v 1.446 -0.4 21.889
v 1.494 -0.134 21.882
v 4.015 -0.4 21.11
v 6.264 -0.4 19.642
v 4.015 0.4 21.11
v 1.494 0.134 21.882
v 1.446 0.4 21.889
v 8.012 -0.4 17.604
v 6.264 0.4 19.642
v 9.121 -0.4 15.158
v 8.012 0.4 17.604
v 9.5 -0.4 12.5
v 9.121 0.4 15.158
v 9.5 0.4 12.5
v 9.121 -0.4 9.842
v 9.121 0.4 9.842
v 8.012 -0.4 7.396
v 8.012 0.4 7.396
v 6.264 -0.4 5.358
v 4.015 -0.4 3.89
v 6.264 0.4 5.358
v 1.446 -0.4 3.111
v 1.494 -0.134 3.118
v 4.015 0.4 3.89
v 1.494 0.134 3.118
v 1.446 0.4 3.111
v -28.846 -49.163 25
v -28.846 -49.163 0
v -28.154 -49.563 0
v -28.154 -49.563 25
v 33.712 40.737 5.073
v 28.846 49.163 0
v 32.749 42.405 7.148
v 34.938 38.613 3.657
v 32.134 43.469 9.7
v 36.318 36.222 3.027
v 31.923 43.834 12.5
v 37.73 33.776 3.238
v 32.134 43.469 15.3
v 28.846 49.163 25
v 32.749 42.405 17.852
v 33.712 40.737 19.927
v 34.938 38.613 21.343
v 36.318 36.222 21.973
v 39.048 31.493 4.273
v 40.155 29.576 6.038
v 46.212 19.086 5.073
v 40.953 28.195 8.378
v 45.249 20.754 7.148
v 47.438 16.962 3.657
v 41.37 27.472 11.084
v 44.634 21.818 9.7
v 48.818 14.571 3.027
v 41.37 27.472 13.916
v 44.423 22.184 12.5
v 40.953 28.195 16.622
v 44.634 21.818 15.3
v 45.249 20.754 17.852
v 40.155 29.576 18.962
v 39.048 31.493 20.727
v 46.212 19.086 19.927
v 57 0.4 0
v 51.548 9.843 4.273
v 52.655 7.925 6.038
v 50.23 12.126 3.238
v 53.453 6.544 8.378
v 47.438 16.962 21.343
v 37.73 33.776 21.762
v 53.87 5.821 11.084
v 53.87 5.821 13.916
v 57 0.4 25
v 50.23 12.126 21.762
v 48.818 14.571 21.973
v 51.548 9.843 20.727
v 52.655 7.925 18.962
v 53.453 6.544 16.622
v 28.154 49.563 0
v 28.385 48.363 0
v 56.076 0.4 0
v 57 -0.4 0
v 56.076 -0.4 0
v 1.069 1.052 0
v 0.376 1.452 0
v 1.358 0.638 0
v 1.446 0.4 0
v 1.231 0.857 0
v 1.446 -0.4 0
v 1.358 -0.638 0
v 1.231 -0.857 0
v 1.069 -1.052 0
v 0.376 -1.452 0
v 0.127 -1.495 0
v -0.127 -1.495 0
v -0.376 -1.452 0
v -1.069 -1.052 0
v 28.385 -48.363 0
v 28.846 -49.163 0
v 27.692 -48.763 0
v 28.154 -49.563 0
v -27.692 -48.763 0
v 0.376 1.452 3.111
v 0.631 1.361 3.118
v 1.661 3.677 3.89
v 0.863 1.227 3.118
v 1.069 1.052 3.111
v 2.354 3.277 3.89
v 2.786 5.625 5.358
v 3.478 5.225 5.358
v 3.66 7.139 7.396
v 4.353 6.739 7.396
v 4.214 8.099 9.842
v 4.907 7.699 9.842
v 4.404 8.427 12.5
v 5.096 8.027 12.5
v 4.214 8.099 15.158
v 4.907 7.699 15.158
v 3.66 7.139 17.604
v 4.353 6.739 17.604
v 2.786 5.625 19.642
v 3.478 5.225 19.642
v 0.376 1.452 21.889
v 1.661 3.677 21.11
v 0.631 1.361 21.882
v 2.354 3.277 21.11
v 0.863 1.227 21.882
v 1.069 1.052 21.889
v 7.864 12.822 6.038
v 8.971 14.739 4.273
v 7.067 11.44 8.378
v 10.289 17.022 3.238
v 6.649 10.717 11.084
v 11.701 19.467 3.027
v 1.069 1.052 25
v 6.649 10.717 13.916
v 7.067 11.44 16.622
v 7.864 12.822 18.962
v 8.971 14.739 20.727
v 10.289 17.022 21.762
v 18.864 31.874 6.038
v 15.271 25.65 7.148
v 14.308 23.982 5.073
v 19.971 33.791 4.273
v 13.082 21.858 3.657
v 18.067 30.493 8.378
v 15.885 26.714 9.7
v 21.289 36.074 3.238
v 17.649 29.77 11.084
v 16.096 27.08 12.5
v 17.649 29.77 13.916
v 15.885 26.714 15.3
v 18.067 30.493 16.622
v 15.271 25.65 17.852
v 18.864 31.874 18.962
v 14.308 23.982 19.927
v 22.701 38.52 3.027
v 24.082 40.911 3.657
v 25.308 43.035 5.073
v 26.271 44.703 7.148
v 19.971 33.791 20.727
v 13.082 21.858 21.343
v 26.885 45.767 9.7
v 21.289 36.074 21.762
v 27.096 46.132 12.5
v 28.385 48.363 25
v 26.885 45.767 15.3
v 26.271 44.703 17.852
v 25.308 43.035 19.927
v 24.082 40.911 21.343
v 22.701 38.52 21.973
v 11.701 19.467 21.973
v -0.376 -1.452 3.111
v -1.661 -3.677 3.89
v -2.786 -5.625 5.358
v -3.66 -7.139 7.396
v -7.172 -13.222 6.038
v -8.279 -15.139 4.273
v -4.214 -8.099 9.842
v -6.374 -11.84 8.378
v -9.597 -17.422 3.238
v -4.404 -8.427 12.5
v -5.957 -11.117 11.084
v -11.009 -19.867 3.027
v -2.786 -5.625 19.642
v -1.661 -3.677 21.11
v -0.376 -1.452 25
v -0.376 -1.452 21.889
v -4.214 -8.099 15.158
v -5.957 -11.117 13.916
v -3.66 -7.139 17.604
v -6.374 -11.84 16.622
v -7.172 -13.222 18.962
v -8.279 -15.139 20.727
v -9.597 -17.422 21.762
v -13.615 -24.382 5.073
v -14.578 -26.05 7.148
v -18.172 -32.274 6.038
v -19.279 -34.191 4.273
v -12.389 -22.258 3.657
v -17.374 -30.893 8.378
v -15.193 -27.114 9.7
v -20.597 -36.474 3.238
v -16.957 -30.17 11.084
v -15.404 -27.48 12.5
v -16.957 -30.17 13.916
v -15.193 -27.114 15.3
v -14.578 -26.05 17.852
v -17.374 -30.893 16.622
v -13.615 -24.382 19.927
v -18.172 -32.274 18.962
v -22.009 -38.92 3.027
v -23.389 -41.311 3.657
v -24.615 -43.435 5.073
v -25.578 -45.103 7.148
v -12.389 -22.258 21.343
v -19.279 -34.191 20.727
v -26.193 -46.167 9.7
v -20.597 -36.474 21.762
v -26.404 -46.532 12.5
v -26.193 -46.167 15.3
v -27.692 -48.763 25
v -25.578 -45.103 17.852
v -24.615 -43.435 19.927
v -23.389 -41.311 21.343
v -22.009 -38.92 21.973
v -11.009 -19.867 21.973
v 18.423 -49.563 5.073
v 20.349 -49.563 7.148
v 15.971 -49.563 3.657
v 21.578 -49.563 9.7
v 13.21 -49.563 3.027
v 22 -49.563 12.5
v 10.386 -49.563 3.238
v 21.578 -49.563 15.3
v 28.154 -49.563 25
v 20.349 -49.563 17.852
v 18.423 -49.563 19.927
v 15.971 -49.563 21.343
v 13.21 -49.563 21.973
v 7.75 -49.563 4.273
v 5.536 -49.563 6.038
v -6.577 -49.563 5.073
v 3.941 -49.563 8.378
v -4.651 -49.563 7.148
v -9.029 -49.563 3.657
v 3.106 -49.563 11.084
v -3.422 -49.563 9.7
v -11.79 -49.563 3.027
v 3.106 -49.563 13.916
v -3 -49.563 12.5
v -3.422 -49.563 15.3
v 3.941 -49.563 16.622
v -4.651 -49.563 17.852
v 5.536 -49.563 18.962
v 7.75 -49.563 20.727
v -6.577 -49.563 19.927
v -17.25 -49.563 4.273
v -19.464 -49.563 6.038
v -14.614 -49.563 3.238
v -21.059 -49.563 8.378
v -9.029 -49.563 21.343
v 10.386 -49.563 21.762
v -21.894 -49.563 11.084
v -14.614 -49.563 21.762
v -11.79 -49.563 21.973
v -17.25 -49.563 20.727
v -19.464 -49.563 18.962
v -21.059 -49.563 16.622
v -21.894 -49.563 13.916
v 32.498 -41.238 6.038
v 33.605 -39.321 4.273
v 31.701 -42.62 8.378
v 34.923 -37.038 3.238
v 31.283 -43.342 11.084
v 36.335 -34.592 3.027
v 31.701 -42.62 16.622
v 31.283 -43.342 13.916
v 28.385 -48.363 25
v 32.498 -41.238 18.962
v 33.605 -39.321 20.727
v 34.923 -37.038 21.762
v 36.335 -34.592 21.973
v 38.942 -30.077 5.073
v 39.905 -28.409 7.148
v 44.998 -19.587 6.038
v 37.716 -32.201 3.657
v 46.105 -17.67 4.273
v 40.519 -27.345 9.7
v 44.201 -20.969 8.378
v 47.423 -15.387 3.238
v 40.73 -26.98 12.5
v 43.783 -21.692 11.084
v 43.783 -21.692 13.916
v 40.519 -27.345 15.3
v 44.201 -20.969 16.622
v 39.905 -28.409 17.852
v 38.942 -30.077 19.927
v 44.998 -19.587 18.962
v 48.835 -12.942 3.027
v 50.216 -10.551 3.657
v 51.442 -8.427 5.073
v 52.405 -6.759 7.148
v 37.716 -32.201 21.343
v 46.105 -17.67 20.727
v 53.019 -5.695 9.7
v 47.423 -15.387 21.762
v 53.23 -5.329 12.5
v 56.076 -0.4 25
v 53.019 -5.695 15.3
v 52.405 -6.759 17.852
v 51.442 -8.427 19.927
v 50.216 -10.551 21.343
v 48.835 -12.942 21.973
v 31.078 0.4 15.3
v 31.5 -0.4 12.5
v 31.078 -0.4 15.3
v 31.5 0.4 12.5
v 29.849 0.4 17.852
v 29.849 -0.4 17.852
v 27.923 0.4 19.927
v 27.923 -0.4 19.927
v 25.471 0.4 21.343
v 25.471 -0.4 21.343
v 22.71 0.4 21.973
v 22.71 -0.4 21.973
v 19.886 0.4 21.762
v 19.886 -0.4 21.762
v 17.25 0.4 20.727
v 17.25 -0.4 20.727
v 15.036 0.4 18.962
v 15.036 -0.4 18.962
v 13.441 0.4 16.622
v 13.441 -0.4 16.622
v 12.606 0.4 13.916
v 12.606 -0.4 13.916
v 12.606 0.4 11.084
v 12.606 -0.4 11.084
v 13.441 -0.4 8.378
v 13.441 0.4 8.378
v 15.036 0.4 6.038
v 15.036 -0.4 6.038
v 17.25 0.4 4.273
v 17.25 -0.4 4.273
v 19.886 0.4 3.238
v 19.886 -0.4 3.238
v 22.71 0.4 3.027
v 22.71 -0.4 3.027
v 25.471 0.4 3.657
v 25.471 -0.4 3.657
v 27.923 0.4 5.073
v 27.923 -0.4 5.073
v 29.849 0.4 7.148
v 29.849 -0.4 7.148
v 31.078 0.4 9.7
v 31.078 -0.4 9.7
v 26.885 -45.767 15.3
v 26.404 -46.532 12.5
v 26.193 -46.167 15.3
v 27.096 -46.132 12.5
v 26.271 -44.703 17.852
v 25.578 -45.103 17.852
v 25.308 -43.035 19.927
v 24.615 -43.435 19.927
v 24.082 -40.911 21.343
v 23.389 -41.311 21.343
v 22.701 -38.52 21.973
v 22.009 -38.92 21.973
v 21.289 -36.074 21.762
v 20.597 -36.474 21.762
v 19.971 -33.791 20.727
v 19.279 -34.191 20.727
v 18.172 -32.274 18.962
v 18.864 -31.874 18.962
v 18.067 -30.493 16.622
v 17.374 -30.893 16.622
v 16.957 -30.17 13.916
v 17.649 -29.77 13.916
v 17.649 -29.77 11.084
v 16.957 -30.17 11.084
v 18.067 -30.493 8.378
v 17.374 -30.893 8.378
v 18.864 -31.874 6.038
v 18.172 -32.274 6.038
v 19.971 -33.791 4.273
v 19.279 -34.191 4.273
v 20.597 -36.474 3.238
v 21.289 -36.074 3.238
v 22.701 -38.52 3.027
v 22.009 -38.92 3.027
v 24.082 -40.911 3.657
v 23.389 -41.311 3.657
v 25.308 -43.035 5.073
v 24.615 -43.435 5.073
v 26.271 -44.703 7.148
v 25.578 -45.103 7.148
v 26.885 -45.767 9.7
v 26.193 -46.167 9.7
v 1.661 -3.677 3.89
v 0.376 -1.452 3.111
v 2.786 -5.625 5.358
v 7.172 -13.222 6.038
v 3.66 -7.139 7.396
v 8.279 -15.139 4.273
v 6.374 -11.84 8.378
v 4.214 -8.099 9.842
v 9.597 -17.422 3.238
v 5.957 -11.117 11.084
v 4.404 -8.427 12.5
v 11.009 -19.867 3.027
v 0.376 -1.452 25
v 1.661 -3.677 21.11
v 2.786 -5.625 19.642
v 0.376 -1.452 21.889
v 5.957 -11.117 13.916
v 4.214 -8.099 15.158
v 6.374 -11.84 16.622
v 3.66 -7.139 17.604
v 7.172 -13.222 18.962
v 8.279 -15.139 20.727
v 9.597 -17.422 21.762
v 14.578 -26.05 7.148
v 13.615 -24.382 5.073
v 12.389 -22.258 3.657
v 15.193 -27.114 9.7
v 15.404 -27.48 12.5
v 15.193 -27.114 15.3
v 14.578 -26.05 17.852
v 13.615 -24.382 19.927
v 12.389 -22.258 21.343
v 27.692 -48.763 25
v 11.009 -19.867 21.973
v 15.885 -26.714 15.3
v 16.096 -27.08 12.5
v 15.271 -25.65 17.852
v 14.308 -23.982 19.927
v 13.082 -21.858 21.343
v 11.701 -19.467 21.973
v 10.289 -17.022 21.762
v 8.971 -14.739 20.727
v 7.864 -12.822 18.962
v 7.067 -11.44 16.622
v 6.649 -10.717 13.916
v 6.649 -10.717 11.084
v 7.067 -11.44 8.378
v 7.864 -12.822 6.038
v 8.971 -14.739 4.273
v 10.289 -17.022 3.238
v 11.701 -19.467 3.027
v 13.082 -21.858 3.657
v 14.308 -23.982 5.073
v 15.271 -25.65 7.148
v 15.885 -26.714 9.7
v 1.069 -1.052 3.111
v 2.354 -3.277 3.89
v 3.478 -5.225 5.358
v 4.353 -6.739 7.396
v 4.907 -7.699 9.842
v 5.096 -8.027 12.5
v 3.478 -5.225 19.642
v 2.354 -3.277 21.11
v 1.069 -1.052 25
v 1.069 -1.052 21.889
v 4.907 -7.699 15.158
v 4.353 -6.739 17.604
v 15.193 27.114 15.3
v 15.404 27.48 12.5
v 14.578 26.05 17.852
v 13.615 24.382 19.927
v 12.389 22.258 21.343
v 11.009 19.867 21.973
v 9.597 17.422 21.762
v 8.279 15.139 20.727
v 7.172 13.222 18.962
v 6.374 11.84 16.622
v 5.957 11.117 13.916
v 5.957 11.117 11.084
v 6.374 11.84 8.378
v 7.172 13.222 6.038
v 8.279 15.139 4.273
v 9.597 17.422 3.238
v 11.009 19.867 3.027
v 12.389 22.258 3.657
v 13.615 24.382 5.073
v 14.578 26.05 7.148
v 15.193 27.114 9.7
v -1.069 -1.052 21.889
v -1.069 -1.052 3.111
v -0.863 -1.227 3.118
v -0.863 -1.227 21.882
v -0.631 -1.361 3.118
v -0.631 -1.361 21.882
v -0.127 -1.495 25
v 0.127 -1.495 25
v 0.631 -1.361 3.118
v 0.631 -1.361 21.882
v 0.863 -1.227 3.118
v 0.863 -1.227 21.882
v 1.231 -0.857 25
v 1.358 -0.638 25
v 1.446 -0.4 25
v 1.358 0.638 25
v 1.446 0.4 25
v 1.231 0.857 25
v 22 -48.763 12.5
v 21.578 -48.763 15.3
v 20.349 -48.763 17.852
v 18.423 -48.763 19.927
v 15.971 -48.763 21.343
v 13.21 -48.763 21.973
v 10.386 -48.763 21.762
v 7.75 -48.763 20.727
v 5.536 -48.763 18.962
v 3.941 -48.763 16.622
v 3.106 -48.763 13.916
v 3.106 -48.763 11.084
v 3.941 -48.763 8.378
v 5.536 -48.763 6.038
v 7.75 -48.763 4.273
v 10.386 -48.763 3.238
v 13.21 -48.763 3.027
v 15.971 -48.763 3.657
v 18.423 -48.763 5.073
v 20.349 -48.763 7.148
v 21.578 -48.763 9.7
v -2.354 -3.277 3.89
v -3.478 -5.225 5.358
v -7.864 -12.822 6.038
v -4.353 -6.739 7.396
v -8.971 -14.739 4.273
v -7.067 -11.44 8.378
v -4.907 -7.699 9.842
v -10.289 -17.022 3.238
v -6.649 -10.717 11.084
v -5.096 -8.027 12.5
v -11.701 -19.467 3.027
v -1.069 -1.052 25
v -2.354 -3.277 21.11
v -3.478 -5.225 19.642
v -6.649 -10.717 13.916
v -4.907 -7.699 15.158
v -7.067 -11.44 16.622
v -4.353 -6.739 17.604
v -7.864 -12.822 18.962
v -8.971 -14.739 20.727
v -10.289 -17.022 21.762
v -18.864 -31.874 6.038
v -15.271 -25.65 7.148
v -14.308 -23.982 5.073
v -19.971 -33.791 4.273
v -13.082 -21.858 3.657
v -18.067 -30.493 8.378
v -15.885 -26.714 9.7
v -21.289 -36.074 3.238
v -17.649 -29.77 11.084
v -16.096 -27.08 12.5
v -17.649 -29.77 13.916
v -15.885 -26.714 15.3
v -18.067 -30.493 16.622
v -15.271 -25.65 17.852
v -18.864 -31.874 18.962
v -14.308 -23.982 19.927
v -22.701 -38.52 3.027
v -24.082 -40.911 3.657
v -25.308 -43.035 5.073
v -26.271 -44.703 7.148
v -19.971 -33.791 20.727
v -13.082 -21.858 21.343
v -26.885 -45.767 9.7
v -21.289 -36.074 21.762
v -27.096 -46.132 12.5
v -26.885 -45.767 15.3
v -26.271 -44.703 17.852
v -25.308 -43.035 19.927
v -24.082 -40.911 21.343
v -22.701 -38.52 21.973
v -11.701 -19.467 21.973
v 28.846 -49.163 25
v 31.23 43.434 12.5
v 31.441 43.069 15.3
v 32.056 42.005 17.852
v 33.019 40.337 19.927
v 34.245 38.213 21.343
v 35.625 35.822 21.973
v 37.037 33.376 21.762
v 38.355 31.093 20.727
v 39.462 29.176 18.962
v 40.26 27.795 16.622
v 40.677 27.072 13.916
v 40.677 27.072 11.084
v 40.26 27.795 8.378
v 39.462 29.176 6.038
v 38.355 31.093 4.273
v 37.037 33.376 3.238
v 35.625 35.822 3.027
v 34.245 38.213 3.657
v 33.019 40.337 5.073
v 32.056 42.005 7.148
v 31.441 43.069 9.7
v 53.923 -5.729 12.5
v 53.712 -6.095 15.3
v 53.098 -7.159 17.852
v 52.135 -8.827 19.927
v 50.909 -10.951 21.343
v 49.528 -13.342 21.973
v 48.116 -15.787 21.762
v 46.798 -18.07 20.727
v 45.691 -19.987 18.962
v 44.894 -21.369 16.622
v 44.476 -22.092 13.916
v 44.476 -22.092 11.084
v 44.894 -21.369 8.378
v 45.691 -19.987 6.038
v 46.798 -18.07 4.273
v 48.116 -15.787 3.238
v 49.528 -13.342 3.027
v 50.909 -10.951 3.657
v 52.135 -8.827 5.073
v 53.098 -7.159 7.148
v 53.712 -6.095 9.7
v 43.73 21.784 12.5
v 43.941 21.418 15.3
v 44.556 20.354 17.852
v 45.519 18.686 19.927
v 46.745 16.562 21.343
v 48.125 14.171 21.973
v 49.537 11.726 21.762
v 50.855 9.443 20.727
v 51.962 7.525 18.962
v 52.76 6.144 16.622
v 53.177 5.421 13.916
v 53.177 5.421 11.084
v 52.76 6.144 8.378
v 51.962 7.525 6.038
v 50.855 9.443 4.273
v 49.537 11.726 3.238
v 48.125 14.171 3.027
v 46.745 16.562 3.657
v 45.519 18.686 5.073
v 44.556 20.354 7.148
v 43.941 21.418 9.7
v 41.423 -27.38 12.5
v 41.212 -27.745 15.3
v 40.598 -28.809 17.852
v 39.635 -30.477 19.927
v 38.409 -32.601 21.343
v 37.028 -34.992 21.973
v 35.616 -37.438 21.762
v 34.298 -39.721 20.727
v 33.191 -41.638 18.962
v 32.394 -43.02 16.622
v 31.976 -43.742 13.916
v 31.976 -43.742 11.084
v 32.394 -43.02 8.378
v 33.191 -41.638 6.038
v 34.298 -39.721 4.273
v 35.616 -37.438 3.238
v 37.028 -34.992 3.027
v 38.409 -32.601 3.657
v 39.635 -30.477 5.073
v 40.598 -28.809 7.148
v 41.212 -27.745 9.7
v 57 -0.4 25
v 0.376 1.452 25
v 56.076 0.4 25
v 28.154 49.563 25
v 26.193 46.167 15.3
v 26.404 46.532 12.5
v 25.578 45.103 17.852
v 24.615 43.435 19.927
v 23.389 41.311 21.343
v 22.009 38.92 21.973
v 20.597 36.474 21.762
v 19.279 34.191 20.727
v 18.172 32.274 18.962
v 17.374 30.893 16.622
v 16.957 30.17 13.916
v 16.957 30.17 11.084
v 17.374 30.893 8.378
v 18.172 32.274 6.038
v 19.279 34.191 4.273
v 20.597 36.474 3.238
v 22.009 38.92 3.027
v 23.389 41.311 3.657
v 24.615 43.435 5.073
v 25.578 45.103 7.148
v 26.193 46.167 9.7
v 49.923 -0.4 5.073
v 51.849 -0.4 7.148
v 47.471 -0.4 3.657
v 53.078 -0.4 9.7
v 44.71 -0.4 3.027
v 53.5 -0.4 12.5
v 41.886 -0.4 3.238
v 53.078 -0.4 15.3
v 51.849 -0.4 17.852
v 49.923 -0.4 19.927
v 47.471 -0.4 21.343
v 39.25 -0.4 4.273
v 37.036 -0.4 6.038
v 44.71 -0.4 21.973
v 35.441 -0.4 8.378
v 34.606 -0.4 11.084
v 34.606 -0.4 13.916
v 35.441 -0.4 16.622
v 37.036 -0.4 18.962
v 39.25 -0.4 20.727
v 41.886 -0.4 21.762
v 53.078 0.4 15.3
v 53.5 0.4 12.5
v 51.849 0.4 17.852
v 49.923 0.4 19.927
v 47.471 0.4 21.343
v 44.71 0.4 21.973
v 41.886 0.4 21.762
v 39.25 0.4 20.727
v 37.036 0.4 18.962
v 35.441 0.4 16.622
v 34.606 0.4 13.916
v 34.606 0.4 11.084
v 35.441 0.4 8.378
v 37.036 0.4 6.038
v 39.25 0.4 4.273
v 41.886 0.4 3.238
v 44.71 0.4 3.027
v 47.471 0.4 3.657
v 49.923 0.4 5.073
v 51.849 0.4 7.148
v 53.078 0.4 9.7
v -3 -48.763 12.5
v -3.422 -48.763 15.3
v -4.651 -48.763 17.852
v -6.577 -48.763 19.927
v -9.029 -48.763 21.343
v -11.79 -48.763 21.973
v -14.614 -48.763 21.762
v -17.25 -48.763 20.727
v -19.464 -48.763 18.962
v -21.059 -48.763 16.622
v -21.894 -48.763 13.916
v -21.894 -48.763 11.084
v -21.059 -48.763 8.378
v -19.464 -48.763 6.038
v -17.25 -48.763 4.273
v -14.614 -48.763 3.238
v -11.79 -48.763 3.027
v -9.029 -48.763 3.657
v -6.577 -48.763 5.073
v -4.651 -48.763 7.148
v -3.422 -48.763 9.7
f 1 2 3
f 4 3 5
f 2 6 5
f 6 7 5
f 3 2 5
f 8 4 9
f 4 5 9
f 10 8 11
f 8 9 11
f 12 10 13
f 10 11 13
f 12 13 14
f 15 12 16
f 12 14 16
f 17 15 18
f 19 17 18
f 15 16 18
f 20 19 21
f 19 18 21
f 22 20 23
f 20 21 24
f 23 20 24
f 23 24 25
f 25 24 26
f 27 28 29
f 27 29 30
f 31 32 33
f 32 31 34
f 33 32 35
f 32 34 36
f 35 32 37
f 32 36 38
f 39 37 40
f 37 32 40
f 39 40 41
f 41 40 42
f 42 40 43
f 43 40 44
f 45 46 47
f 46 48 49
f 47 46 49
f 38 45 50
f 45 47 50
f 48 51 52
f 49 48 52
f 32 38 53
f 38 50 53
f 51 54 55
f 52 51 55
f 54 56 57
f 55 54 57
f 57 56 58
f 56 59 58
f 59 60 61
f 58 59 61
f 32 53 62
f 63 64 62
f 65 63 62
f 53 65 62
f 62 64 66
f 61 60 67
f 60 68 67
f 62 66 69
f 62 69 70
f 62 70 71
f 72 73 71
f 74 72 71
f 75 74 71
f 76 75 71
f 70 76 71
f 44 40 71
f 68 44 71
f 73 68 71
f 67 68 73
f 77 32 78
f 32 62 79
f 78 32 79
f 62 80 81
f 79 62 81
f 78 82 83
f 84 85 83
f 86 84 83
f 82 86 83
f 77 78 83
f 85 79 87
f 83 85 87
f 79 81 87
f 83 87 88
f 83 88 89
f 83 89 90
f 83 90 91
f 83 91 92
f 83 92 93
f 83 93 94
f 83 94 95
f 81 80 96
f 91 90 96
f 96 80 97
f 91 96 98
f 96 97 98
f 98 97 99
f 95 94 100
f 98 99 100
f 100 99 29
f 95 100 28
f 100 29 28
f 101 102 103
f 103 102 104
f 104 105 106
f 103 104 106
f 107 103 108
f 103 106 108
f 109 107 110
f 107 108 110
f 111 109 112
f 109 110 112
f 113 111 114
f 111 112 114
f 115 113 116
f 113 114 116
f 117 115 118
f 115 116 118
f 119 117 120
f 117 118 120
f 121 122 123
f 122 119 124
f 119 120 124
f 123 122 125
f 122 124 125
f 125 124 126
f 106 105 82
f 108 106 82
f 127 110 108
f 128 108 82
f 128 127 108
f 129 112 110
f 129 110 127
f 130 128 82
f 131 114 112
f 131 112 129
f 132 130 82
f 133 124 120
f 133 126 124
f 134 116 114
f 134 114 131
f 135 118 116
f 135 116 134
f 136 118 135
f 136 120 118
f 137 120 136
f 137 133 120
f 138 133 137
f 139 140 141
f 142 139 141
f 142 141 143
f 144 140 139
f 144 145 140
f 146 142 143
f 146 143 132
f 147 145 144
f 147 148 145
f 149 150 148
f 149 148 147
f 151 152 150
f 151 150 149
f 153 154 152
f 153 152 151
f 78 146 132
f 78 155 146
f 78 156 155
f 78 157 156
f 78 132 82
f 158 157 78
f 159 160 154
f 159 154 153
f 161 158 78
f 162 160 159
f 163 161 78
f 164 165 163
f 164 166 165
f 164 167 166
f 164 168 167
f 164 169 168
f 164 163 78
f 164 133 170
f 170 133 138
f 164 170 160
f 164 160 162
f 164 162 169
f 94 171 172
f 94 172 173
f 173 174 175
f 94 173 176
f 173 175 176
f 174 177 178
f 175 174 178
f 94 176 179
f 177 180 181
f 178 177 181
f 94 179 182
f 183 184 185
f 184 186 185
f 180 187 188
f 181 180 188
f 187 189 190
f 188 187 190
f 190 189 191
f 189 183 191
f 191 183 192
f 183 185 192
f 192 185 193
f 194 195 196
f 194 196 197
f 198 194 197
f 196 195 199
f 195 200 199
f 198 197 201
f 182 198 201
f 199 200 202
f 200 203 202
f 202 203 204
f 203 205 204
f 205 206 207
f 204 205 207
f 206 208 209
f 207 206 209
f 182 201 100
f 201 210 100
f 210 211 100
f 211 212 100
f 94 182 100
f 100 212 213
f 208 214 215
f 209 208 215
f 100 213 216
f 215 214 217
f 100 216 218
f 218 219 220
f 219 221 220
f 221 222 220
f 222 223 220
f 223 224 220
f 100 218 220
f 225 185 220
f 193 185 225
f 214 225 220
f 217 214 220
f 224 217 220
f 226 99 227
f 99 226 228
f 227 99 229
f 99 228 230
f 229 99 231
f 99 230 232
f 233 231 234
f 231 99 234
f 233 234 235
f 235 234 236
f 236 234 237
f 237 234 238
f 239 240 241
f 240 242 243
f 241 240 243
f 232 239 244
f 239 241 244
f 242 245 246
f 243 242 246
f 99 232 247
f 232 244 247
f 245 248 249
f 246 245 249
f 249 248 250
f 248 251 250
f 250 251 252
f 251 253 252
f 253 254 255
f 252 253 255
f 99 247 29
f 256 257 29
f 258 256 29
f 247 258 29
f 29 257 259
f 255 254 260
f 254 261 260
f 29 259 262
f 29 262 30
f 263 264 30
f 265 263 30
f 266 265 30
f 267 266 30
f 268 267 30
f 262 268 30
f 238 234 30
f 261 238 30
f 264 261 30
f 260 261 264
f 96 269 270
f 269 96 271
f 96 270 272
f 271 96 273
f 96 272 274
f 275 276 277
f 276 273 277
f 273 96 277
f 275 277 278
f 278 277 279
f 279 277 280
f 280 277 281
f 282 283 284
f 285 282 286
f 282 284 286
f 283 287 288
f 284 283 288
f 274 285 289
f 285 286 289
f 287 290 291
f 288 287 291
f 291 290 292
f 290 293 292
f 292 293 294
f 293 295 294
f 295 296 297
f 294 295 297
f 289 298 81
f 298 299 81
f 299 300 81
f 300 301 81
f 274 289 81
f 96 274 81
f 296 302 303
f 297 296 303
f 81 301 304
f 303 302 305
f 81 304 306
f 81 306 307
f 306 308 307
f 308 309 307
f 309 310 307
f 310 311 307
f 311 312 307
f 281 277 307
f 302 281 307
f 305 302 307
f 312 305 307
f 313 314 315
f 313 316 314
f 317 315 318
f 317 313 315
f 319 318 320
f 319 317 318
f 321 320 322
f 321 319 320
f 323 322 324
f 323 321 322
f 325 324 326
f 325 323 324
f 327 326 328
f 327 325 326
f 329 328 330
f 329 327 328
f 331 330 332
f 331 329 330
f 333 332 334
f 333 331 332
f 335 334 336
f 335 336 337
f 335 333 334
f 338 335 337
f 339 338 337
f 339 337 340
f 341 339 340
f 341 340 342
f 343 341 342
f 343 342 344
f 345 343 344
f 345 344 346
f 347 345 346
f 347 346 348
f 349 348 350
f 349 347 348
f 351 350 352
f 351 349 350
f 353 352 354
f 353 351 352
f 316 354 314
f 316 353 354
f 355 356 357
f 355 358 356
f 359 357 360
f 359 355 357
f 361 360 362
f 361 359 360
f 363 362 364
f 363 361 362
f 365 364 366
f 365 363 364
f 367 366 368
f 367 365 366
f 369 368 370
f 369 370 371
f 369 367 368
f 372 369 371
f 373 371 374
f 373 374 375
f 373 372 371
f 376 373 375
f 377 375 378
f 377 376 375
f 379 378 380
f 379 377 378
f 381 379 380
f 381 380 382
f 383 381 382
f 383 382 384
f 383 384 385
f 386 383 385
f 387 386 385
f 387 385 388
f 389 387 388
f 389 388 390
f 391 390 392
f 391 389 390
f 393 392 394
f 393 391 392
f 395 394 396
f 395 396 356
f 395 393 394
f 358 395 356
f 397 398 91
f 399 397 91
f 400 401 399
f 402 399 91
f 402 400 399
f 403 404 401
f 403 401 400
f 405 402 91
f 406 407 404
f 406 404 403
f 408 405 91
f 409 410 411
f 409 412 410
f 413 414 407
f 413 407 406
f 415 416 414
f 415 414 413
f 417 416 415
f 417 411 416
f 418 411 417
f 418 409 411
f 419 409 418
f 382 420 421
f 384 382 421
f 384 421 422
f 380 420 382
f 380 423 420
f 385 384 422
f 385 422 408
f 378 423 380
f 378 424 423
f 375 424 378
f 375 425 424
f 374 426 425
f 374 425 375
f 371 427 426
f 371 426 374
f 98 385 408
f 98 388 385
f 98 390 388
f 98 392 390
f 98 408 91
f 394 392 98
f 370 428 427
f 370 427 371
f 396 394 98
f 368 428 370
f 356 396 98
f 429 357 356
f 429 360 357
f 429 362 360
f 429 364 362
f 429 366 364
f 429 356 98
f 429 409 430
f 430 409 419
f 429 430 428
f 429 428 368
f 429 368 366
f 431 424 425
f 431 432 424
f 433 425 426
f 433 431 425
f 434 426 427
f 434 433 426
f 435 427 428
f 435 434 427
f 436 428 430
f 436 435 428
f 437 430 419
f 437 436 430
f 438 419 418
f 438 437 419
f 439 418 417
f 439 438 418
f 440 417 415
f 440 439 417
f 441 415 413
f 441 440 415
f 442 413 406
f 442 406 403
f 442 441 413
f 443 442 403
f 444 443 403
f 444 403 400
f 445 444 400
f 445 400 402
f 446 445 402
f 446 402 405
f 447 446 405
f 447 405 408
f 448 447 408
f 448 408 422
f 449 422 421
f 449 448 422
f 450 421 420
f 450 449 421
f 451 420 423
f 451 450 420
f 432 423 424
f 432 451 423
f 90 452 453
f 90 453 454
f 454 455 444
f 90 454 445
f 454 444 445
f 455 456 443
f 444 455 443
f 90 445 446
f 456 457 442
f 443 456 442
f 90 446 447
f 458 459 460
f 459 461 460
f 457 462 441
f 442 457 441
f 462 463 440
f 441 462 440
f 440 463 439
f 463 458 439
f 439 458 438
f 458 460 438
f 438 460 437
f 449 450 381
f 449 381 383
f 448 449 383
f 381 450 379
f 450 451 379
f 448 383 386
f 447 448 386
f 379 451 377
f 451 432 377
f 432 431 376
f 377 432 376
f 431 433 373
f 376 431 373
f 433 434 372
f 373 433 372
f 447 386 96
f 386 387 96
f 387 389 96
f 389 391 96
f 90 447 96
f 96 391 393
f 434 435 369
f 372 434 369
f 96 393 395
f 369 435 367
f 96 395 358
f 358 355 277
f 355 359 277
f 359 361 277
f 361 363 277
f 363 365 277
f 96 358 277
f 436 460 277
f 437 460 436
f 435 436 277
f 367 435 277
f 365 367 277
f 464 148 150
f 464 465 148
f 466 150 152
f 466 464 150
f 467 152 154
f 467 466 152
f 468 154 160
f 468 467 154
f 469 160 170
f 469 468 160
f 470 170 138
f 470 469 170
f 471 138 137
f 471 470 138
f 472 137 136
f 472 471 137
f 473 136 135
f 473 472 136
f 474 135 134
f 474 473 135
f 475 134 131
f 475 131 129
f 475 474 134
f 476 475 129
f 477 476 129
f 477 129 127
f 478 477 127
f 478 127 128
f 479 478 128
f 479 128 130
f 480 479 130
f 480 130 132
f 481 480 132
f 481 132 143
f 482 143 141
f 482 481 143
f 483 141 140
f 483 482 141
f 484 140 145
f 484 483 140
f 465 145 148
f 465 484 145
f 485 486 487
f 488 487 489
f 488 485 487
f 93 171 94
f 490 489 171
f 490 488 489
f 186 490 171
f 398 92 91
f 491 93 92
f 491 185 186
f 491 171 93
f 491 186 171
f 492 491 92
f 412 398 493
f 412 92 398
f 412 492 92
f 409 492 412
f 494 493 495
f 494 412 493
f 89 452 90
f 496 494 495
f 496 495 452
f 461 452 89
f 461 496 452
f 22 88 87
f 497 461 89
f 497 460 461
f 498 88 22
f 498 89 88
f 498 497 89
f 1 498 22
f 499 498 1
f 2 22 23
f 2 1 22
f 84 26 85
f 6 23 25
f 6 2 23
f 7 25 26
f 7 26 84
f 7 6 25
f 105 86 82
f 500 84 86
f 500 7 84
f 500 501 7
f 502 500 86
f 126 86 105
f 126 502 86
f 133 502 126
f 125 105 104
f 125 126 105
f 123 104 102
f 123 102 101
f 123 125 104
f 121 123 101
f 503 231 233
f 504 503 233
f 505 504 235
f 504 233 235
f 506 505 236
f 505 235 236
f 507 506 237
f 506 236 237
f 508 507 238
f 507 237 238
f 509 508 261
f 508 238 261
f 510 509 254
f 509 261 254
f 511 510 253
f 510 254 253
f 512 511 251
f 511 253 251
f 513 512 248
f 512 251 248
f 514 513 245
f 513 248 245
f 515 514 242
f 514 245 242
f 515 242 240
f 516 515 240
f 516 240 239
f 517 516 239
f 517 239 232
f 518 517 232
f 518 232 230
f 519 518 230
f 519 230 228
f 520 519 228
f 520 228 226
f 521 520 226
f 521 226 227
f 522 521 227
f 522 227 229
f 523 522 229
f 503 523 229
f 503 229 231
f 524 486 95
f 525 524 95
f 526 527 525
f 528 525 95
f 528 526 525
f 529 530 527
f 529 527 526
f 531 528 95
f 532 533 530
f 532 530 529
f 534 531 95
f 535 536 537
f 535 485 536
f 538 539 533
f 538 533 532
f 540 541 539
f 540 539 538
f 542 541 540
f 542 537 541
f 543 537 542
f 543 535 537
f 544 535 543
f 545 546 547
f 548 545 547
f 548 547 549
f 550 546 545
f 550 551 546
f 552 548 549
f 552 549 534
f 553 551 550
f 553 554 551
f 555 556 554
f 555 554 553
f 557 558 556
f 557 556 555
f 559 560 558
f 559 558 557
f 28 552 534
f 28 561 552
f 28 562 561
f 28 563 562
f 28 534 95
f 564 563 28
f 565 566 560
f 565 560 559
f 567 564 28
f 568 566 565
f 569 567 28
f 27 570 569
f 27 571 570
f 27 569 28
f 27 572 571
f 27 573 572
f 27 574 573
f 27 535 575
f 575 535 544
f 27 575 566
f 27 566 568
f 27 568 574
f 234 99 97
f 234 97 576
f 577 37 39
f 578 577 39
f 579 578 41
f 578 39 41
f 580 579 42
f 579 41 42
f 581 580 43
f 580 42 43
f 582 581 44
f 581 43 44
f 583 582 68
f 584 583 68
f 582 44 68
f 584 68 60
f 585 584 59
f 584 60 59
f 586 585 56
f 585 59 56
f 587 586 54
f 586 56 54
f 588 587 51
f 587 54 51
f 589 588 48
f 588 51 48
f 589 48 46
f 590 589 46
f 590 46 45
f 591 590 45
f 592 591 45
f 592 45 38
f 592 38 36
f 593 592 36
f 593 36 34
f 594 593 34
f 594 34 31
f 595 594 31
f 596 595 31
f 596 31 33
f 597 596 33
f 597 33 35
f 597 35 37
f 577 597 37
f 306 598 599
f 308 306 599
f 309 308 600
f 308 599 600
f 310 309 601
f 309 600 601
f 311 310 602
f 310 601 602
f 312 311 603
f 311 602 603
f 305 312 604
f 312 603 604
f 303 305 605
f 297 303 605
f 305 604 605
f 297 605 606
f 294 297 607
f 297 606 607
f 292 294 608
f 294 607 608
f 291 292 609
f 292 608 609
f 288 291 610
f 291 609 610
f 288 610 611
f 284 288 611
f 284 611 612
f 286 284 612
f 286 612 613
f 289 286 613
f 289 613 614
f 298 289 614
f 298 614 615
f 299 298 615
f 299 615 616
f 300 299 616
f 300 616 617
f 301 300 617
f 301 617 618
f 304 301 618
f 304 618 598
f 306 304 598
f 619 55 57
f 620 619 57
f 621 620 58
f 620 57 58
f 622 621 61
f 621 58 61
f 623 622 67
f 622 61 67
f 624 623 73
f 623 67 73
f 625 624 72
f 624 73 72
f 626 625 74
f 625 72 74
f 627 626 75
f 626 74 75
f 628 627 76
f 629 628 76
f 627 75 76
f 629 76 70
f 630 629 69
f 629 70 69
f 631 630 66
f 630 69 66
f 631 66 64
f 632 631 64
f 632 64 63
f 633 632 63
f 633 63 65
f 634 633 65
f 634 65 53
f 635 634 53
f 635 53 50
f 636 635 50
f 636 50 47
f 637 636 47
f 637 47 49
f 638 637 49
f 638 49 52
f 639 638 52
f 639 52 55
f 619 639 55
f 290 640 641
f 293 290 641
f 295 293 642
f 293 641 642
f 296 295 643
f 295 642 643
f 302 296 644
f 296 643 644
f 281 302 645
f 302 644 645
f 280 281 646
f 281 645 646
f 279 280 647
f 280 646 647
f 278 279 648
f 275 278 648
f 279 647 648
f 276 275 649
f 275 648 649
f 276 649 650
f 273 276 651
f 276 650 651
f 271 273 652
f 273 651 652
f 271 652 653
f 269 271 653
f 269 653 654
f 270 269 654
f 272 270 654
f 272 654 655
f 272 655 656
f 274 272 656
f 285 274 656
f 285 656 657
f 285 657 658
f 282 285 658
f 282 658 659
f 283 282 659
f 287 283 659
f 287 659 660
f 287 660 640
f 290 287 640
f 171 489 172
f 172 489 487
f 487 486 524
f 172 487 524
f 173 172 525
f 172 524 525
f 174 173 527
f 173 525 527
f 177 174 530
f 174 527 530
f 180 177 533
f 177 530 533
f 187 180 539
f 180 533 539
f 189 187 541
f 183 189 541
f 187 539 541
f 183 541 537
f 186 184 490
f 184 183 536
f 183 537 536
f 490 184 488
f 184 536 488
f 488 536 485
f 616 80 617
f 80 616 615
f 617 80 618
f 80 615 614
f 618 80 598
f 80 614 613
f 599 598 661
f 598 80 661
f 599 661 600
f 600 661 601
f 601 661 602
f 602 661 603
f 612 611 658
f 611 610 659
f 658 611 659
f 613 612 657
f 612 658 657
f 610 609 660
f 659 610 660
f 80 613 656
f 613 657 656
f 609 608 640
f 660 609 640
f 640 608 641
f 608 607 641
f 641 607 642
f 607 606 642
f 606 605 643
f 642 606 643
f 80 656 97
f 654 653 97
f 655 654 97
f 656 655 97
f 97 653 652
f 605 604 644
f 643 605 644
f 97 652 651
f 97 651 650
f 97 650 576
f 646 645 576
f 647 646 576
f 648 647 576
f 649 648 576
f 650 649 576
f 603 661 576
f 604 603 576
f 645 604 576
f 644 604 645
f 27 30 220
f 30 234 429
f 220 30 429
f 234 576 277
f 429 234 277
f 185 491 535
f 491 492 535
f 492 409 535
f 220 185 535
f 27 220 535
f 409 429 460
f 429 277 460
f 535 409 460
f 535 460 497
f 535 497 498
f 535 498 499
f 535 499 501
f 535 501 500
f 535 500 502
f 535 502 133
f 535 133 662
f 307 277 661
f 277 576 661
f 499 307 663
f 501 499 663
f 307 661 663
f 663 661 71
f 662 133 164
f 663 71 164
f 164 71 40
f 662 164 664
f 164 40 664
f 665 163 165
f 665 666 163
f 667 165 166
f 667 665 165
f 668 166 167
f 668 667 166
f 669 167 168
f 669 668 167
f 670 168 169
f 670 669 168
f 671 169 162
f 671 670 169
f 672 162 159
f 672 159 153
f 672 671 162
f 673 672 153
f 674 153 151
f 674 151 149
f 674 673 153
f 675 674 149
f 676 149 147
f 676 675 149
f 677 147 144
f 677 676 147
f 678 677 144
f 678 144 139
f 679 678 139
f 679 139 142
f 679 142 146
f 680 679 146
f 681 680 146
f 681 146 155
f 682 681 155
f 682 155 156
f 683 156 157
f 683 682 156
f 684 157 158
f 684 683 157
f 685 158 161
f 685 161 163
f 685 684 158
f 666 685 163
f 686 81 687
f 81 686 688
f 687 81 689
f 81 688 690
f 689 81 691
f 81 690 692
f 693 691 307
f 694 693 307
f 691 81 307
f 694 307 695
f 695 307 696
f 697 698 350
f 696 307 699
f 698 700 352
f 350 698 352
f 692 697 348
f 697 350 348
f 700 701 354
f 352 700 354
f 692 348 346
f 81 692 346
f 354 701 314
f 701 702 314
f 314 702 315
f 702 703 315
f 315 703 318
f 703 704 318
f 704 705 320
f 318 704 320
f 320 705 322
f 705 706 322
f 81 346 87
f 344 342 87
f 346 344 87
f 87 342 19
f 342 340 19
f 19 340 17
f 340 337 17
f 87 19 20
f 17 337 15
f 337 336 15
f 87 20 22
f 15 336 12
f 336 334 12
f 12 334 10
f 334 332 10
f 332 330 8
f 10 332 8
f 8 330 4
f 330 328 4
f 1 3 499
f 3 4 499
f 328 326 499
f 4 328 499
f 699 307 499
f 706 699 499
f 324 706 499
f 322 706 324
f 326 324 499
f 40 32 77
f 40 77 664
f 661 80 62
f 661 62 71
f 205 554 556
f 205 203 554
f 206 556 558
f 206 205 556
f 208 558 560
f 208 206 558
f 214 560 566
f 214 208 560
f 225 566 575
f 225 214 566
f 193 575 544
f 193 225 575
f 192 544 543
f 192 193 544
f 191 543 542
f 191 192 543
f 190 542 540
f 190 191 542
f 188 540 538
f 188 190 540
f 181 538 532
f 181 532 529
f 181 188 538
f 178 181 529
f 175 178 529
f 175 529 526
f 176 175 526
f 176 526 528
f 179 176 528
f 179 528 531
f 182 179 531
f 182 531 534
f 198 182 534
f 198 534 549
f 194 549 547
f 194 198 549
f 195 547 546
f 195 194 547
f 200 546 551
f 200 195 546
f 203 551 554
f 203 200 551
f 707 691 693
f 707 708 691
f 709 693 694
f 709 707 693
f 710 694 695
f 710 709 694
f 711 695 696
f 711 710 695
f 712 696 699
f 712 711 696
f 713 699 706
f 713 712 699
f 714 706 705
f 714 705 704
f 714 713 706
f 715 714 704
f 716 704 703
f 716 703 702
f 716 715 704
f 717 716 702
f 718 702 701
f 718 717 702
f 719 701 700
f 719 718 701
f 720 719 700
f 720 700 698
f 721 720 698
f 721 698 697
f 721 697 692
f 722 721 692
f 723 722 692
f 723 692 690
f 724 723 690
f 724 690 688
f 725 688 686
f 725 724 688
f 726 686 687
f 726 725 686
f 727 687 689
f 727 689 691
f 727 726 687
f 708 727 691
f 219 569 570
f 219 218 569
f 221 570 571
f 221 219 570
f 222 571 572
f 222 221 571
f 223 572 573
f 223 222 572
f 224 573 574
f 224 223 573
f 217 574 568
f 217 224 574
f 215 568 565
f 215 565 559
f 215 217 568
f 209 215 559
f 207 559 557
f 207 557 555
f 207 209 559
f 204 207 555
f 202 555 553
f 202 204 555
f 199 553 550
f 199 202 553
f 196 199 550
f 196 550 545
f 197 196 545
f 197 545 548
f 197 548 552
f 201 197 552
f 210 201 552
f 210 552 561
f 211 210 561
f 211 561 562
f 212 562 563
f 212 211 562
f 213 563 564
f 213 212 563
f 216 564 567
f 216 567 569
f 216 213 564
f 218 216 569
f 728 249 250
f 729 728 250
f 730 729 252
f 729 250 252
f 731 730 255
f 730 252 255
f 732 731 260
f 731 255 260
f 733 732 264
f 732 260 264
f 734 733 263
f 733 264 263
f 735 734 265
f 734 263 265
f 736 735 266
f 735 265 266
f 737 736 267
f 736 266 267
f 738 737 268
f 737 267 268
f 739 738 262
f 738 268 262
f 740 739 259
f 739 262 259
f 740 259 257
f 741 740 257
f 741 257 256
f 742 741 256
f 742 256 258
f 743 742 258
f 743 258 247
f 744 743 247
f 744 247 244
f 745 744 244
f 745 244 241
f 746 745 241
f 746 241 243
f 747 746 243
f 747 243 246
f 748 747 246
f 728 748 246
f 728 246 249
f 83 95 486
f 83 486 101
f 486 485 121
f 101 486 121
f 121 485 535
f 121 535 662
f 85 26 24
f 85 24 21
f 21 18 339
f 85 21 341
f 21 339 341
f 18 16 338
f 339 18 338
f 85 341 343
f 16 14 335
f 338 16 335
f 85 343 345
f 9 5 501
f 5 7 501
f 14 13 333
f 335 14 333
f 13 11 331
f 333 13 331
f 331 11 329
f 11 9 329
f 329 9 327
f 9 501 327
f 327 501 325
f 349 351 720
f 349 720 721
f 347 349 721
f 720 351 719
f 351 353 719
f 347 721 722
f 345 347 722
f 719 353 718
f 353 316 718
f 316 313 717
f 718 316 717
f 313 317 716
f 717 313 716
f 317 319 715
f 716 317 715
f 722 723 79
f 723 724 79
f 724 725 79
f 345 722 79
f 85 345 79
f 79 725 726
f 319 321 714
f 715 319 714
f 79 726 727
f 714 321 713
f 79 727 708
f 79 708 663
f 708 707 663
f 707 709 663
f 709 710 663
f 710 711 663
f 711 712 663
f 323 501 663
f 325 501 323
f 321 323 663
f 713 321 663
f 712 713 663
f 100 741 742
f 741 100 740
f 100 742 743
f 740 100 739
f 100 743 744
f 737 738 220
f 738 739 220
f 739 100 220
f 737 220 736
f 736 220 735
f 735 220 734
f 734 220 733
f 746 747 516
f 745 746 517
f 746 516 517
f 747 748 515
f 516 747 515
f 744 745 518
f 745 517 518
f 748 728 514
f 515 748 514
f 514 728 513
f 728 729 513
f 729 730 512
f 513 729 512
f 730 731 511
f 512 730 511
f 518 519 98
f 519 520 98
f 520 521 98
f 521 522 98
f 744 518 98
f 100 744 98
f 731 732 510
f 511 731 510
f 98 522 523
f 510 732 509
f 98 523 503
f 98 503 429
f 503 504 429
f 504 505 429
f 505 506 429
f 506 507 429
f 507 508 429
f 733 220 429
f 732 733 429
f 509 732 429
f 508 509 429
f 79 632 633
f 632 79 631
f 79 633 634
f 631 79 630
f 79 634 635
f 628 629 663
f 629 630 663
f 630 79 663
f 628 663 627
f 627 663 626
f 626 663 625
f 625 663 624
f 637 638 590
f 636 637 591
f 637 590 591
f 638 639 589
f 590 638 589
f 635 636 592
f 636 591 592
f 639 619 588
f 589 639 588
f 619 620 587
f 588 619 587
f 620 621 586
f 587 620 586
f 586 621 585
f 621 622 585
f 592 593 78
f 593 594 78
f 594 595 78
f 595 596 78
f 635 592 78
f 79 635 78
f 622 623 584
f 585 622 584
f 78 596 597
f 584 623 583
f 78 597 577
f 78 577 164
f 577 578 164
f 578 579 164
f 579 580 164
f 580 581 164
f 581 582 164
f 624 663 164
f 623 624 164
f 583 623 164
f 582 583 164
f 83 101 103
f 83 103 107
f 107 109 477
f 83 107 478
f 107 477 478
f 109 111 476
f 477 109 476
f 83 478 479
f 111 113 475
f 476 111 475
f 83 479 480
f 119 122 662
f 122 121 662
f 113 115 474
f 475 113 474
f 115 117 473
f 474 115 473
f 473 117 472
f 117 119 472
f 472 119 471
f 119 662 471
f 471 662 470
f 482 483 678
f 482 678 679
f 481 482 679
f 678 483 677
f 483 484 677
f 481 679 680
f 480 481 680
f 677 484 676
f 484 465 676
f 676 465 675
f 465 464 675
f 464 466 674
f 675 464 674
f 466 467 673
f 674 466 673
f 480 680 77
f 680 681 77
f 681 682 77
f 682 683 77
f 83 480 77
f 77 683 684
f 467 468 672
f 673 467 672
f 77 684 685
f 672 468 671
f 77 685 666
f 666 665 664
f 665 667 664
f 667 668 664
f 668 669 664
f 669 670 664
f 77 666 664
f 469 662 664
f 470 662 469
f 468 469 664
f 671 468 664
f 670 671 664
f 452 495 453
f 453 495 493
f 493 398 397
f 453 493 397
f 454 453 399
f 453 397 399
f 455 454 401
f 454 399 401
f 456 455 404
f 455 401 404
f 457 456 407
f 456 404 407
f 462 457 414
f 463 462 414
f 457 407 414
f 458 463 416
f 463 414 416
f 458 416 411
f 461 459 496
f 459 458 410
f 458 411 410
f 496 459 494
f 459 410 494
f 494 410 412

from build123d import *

# Parameters (mm, degrees)
SKETCH_R              = 9.5
PAD_DEPTH             = 0.4
POLARPATTERN_COUNT    = 6
PAD001_DEPTH          = 25
POLARPATTERN001_COUNT = 3
POLARPATTERN001_ANGLE = 120
SKETCH002_R           = 9.5
POCKET_DEPTH          = 2
POLARPATTERN002_COUNT = 6
SKETCH003_R           = 1.5
PAD002_DEPTH          = 25
POCKET001_DEPTH       = 25


with BuildPart() as part:
    # Sketch → Pad (new body, symmetric)
    with BuildSketch(Plane.XZ):
        with BuildLine():
            Line((0, 0), (57, 0))
            Line((57, 0), (57, 25))
            Line((57, 25), (0, 25))
            Line((0, 25), (0, 22))
            ThreePointArc((0, 3), (9.5, 12.5), (0, 22))
            Line((0, 3), (0, 0))
        make_face()
        with Locations((22, 12.5)):
            Circle(SKETCH_R, mode=Mode.SUBTRACT)
        with Locations((44, 12.5)):
            Circle(SKETCH_R, mode=Mode.SUBTRACT)
    pad = extrude(amount=PAD_DEPTH, both=True)

    # PolarPattern: Pad ×6 about axis
    polarpattern_axis = Axis((0, 0, 0), (0, 0, 1))
    for i in range(1, POLARPATTERN_COUNT):
        add(pad.rotate(polarpattern_axis, i * 360 / POLARPATTERN_COUNT))

    # Sketch001 (on Face61 of PolarPattern) → Pad001 (join)
    with BuildSketch(Plane(origin=(0, 0, 25), x_dir=(-1, 0, 0), z_dir=(0, 0, 1))):
        Polygon((-28.15359, 49.563448), (28.15359, 49.563448), (27.69171, 48.763448), (-27.69171, 48.763448), align=None)
    pad001 = extrude(amount=-PAD001_DEPTH)

    # PolarPattern001: Pad001 ×3 about axis
    polarpattern001_axis = Axis((0, 0, 25), (0, 0, 1))
    for i in range(1, POLARPATTERN001_COUNT):
        add(pad001.rotate(polarpattern001_axis, i * POLARPATTERN001_ANGLE / (POLARPATTERN001_COUNT - 1)))

    # Sketch002 (on Face59 of Pad001) → Pocket (cut)
    with BuildSketch(Plane.XZ.offset(49.563448)):
        with Locations((-12.5, 12.5)):
            Circle(SKETCH002_R)
        with Locations((12.5, 12.5)):
            Circle(SKETCH002_R)
    pocket = extrude(amount=-POCKET_DEPTH, mode=Mode.SUBTRACT)

    # PolarPattern002: Pocket ×6 about axis
    polarpattern002_axis = Axis((0, 0, 0), (0, 0, 1))
    for i in range(1, POLARPATTERN002_COUNT):
        add(pocket.rotate(polarpattern002_axis, i * 360 / POLARPATTERN002_COUNT), mode=Mode.SUBTRACT)

    # Sketch003 (on Face68 of PolarPattern002) → Pad002 (join)
    with BuildSketch(Plane(origin=(0, 0, 25), x_dir=(-1, 0, 0), z_dir=(0, 0, 1))):
        Circle(SKETCH003_R)
    extrude(amount=-PAD002_DEPTH)

    # Sketch004 (on Face83 of Pad002) → Pocket001 (cut)
    with BuildSketch(Plane(origin=(0, 0, 25), x_dir=(-1, 0, 0), z_dir=(0, 0, 1))):
        Polygon((28.84641, 49.163448), (-28.15359, -49.563448), (31.376045, -54.075596), (79.795143, 24.207651), align=None)
    extrude(amount=-POCKET001_DEPTH, mode=Mode.SUBTRACT)


solid = part.part
